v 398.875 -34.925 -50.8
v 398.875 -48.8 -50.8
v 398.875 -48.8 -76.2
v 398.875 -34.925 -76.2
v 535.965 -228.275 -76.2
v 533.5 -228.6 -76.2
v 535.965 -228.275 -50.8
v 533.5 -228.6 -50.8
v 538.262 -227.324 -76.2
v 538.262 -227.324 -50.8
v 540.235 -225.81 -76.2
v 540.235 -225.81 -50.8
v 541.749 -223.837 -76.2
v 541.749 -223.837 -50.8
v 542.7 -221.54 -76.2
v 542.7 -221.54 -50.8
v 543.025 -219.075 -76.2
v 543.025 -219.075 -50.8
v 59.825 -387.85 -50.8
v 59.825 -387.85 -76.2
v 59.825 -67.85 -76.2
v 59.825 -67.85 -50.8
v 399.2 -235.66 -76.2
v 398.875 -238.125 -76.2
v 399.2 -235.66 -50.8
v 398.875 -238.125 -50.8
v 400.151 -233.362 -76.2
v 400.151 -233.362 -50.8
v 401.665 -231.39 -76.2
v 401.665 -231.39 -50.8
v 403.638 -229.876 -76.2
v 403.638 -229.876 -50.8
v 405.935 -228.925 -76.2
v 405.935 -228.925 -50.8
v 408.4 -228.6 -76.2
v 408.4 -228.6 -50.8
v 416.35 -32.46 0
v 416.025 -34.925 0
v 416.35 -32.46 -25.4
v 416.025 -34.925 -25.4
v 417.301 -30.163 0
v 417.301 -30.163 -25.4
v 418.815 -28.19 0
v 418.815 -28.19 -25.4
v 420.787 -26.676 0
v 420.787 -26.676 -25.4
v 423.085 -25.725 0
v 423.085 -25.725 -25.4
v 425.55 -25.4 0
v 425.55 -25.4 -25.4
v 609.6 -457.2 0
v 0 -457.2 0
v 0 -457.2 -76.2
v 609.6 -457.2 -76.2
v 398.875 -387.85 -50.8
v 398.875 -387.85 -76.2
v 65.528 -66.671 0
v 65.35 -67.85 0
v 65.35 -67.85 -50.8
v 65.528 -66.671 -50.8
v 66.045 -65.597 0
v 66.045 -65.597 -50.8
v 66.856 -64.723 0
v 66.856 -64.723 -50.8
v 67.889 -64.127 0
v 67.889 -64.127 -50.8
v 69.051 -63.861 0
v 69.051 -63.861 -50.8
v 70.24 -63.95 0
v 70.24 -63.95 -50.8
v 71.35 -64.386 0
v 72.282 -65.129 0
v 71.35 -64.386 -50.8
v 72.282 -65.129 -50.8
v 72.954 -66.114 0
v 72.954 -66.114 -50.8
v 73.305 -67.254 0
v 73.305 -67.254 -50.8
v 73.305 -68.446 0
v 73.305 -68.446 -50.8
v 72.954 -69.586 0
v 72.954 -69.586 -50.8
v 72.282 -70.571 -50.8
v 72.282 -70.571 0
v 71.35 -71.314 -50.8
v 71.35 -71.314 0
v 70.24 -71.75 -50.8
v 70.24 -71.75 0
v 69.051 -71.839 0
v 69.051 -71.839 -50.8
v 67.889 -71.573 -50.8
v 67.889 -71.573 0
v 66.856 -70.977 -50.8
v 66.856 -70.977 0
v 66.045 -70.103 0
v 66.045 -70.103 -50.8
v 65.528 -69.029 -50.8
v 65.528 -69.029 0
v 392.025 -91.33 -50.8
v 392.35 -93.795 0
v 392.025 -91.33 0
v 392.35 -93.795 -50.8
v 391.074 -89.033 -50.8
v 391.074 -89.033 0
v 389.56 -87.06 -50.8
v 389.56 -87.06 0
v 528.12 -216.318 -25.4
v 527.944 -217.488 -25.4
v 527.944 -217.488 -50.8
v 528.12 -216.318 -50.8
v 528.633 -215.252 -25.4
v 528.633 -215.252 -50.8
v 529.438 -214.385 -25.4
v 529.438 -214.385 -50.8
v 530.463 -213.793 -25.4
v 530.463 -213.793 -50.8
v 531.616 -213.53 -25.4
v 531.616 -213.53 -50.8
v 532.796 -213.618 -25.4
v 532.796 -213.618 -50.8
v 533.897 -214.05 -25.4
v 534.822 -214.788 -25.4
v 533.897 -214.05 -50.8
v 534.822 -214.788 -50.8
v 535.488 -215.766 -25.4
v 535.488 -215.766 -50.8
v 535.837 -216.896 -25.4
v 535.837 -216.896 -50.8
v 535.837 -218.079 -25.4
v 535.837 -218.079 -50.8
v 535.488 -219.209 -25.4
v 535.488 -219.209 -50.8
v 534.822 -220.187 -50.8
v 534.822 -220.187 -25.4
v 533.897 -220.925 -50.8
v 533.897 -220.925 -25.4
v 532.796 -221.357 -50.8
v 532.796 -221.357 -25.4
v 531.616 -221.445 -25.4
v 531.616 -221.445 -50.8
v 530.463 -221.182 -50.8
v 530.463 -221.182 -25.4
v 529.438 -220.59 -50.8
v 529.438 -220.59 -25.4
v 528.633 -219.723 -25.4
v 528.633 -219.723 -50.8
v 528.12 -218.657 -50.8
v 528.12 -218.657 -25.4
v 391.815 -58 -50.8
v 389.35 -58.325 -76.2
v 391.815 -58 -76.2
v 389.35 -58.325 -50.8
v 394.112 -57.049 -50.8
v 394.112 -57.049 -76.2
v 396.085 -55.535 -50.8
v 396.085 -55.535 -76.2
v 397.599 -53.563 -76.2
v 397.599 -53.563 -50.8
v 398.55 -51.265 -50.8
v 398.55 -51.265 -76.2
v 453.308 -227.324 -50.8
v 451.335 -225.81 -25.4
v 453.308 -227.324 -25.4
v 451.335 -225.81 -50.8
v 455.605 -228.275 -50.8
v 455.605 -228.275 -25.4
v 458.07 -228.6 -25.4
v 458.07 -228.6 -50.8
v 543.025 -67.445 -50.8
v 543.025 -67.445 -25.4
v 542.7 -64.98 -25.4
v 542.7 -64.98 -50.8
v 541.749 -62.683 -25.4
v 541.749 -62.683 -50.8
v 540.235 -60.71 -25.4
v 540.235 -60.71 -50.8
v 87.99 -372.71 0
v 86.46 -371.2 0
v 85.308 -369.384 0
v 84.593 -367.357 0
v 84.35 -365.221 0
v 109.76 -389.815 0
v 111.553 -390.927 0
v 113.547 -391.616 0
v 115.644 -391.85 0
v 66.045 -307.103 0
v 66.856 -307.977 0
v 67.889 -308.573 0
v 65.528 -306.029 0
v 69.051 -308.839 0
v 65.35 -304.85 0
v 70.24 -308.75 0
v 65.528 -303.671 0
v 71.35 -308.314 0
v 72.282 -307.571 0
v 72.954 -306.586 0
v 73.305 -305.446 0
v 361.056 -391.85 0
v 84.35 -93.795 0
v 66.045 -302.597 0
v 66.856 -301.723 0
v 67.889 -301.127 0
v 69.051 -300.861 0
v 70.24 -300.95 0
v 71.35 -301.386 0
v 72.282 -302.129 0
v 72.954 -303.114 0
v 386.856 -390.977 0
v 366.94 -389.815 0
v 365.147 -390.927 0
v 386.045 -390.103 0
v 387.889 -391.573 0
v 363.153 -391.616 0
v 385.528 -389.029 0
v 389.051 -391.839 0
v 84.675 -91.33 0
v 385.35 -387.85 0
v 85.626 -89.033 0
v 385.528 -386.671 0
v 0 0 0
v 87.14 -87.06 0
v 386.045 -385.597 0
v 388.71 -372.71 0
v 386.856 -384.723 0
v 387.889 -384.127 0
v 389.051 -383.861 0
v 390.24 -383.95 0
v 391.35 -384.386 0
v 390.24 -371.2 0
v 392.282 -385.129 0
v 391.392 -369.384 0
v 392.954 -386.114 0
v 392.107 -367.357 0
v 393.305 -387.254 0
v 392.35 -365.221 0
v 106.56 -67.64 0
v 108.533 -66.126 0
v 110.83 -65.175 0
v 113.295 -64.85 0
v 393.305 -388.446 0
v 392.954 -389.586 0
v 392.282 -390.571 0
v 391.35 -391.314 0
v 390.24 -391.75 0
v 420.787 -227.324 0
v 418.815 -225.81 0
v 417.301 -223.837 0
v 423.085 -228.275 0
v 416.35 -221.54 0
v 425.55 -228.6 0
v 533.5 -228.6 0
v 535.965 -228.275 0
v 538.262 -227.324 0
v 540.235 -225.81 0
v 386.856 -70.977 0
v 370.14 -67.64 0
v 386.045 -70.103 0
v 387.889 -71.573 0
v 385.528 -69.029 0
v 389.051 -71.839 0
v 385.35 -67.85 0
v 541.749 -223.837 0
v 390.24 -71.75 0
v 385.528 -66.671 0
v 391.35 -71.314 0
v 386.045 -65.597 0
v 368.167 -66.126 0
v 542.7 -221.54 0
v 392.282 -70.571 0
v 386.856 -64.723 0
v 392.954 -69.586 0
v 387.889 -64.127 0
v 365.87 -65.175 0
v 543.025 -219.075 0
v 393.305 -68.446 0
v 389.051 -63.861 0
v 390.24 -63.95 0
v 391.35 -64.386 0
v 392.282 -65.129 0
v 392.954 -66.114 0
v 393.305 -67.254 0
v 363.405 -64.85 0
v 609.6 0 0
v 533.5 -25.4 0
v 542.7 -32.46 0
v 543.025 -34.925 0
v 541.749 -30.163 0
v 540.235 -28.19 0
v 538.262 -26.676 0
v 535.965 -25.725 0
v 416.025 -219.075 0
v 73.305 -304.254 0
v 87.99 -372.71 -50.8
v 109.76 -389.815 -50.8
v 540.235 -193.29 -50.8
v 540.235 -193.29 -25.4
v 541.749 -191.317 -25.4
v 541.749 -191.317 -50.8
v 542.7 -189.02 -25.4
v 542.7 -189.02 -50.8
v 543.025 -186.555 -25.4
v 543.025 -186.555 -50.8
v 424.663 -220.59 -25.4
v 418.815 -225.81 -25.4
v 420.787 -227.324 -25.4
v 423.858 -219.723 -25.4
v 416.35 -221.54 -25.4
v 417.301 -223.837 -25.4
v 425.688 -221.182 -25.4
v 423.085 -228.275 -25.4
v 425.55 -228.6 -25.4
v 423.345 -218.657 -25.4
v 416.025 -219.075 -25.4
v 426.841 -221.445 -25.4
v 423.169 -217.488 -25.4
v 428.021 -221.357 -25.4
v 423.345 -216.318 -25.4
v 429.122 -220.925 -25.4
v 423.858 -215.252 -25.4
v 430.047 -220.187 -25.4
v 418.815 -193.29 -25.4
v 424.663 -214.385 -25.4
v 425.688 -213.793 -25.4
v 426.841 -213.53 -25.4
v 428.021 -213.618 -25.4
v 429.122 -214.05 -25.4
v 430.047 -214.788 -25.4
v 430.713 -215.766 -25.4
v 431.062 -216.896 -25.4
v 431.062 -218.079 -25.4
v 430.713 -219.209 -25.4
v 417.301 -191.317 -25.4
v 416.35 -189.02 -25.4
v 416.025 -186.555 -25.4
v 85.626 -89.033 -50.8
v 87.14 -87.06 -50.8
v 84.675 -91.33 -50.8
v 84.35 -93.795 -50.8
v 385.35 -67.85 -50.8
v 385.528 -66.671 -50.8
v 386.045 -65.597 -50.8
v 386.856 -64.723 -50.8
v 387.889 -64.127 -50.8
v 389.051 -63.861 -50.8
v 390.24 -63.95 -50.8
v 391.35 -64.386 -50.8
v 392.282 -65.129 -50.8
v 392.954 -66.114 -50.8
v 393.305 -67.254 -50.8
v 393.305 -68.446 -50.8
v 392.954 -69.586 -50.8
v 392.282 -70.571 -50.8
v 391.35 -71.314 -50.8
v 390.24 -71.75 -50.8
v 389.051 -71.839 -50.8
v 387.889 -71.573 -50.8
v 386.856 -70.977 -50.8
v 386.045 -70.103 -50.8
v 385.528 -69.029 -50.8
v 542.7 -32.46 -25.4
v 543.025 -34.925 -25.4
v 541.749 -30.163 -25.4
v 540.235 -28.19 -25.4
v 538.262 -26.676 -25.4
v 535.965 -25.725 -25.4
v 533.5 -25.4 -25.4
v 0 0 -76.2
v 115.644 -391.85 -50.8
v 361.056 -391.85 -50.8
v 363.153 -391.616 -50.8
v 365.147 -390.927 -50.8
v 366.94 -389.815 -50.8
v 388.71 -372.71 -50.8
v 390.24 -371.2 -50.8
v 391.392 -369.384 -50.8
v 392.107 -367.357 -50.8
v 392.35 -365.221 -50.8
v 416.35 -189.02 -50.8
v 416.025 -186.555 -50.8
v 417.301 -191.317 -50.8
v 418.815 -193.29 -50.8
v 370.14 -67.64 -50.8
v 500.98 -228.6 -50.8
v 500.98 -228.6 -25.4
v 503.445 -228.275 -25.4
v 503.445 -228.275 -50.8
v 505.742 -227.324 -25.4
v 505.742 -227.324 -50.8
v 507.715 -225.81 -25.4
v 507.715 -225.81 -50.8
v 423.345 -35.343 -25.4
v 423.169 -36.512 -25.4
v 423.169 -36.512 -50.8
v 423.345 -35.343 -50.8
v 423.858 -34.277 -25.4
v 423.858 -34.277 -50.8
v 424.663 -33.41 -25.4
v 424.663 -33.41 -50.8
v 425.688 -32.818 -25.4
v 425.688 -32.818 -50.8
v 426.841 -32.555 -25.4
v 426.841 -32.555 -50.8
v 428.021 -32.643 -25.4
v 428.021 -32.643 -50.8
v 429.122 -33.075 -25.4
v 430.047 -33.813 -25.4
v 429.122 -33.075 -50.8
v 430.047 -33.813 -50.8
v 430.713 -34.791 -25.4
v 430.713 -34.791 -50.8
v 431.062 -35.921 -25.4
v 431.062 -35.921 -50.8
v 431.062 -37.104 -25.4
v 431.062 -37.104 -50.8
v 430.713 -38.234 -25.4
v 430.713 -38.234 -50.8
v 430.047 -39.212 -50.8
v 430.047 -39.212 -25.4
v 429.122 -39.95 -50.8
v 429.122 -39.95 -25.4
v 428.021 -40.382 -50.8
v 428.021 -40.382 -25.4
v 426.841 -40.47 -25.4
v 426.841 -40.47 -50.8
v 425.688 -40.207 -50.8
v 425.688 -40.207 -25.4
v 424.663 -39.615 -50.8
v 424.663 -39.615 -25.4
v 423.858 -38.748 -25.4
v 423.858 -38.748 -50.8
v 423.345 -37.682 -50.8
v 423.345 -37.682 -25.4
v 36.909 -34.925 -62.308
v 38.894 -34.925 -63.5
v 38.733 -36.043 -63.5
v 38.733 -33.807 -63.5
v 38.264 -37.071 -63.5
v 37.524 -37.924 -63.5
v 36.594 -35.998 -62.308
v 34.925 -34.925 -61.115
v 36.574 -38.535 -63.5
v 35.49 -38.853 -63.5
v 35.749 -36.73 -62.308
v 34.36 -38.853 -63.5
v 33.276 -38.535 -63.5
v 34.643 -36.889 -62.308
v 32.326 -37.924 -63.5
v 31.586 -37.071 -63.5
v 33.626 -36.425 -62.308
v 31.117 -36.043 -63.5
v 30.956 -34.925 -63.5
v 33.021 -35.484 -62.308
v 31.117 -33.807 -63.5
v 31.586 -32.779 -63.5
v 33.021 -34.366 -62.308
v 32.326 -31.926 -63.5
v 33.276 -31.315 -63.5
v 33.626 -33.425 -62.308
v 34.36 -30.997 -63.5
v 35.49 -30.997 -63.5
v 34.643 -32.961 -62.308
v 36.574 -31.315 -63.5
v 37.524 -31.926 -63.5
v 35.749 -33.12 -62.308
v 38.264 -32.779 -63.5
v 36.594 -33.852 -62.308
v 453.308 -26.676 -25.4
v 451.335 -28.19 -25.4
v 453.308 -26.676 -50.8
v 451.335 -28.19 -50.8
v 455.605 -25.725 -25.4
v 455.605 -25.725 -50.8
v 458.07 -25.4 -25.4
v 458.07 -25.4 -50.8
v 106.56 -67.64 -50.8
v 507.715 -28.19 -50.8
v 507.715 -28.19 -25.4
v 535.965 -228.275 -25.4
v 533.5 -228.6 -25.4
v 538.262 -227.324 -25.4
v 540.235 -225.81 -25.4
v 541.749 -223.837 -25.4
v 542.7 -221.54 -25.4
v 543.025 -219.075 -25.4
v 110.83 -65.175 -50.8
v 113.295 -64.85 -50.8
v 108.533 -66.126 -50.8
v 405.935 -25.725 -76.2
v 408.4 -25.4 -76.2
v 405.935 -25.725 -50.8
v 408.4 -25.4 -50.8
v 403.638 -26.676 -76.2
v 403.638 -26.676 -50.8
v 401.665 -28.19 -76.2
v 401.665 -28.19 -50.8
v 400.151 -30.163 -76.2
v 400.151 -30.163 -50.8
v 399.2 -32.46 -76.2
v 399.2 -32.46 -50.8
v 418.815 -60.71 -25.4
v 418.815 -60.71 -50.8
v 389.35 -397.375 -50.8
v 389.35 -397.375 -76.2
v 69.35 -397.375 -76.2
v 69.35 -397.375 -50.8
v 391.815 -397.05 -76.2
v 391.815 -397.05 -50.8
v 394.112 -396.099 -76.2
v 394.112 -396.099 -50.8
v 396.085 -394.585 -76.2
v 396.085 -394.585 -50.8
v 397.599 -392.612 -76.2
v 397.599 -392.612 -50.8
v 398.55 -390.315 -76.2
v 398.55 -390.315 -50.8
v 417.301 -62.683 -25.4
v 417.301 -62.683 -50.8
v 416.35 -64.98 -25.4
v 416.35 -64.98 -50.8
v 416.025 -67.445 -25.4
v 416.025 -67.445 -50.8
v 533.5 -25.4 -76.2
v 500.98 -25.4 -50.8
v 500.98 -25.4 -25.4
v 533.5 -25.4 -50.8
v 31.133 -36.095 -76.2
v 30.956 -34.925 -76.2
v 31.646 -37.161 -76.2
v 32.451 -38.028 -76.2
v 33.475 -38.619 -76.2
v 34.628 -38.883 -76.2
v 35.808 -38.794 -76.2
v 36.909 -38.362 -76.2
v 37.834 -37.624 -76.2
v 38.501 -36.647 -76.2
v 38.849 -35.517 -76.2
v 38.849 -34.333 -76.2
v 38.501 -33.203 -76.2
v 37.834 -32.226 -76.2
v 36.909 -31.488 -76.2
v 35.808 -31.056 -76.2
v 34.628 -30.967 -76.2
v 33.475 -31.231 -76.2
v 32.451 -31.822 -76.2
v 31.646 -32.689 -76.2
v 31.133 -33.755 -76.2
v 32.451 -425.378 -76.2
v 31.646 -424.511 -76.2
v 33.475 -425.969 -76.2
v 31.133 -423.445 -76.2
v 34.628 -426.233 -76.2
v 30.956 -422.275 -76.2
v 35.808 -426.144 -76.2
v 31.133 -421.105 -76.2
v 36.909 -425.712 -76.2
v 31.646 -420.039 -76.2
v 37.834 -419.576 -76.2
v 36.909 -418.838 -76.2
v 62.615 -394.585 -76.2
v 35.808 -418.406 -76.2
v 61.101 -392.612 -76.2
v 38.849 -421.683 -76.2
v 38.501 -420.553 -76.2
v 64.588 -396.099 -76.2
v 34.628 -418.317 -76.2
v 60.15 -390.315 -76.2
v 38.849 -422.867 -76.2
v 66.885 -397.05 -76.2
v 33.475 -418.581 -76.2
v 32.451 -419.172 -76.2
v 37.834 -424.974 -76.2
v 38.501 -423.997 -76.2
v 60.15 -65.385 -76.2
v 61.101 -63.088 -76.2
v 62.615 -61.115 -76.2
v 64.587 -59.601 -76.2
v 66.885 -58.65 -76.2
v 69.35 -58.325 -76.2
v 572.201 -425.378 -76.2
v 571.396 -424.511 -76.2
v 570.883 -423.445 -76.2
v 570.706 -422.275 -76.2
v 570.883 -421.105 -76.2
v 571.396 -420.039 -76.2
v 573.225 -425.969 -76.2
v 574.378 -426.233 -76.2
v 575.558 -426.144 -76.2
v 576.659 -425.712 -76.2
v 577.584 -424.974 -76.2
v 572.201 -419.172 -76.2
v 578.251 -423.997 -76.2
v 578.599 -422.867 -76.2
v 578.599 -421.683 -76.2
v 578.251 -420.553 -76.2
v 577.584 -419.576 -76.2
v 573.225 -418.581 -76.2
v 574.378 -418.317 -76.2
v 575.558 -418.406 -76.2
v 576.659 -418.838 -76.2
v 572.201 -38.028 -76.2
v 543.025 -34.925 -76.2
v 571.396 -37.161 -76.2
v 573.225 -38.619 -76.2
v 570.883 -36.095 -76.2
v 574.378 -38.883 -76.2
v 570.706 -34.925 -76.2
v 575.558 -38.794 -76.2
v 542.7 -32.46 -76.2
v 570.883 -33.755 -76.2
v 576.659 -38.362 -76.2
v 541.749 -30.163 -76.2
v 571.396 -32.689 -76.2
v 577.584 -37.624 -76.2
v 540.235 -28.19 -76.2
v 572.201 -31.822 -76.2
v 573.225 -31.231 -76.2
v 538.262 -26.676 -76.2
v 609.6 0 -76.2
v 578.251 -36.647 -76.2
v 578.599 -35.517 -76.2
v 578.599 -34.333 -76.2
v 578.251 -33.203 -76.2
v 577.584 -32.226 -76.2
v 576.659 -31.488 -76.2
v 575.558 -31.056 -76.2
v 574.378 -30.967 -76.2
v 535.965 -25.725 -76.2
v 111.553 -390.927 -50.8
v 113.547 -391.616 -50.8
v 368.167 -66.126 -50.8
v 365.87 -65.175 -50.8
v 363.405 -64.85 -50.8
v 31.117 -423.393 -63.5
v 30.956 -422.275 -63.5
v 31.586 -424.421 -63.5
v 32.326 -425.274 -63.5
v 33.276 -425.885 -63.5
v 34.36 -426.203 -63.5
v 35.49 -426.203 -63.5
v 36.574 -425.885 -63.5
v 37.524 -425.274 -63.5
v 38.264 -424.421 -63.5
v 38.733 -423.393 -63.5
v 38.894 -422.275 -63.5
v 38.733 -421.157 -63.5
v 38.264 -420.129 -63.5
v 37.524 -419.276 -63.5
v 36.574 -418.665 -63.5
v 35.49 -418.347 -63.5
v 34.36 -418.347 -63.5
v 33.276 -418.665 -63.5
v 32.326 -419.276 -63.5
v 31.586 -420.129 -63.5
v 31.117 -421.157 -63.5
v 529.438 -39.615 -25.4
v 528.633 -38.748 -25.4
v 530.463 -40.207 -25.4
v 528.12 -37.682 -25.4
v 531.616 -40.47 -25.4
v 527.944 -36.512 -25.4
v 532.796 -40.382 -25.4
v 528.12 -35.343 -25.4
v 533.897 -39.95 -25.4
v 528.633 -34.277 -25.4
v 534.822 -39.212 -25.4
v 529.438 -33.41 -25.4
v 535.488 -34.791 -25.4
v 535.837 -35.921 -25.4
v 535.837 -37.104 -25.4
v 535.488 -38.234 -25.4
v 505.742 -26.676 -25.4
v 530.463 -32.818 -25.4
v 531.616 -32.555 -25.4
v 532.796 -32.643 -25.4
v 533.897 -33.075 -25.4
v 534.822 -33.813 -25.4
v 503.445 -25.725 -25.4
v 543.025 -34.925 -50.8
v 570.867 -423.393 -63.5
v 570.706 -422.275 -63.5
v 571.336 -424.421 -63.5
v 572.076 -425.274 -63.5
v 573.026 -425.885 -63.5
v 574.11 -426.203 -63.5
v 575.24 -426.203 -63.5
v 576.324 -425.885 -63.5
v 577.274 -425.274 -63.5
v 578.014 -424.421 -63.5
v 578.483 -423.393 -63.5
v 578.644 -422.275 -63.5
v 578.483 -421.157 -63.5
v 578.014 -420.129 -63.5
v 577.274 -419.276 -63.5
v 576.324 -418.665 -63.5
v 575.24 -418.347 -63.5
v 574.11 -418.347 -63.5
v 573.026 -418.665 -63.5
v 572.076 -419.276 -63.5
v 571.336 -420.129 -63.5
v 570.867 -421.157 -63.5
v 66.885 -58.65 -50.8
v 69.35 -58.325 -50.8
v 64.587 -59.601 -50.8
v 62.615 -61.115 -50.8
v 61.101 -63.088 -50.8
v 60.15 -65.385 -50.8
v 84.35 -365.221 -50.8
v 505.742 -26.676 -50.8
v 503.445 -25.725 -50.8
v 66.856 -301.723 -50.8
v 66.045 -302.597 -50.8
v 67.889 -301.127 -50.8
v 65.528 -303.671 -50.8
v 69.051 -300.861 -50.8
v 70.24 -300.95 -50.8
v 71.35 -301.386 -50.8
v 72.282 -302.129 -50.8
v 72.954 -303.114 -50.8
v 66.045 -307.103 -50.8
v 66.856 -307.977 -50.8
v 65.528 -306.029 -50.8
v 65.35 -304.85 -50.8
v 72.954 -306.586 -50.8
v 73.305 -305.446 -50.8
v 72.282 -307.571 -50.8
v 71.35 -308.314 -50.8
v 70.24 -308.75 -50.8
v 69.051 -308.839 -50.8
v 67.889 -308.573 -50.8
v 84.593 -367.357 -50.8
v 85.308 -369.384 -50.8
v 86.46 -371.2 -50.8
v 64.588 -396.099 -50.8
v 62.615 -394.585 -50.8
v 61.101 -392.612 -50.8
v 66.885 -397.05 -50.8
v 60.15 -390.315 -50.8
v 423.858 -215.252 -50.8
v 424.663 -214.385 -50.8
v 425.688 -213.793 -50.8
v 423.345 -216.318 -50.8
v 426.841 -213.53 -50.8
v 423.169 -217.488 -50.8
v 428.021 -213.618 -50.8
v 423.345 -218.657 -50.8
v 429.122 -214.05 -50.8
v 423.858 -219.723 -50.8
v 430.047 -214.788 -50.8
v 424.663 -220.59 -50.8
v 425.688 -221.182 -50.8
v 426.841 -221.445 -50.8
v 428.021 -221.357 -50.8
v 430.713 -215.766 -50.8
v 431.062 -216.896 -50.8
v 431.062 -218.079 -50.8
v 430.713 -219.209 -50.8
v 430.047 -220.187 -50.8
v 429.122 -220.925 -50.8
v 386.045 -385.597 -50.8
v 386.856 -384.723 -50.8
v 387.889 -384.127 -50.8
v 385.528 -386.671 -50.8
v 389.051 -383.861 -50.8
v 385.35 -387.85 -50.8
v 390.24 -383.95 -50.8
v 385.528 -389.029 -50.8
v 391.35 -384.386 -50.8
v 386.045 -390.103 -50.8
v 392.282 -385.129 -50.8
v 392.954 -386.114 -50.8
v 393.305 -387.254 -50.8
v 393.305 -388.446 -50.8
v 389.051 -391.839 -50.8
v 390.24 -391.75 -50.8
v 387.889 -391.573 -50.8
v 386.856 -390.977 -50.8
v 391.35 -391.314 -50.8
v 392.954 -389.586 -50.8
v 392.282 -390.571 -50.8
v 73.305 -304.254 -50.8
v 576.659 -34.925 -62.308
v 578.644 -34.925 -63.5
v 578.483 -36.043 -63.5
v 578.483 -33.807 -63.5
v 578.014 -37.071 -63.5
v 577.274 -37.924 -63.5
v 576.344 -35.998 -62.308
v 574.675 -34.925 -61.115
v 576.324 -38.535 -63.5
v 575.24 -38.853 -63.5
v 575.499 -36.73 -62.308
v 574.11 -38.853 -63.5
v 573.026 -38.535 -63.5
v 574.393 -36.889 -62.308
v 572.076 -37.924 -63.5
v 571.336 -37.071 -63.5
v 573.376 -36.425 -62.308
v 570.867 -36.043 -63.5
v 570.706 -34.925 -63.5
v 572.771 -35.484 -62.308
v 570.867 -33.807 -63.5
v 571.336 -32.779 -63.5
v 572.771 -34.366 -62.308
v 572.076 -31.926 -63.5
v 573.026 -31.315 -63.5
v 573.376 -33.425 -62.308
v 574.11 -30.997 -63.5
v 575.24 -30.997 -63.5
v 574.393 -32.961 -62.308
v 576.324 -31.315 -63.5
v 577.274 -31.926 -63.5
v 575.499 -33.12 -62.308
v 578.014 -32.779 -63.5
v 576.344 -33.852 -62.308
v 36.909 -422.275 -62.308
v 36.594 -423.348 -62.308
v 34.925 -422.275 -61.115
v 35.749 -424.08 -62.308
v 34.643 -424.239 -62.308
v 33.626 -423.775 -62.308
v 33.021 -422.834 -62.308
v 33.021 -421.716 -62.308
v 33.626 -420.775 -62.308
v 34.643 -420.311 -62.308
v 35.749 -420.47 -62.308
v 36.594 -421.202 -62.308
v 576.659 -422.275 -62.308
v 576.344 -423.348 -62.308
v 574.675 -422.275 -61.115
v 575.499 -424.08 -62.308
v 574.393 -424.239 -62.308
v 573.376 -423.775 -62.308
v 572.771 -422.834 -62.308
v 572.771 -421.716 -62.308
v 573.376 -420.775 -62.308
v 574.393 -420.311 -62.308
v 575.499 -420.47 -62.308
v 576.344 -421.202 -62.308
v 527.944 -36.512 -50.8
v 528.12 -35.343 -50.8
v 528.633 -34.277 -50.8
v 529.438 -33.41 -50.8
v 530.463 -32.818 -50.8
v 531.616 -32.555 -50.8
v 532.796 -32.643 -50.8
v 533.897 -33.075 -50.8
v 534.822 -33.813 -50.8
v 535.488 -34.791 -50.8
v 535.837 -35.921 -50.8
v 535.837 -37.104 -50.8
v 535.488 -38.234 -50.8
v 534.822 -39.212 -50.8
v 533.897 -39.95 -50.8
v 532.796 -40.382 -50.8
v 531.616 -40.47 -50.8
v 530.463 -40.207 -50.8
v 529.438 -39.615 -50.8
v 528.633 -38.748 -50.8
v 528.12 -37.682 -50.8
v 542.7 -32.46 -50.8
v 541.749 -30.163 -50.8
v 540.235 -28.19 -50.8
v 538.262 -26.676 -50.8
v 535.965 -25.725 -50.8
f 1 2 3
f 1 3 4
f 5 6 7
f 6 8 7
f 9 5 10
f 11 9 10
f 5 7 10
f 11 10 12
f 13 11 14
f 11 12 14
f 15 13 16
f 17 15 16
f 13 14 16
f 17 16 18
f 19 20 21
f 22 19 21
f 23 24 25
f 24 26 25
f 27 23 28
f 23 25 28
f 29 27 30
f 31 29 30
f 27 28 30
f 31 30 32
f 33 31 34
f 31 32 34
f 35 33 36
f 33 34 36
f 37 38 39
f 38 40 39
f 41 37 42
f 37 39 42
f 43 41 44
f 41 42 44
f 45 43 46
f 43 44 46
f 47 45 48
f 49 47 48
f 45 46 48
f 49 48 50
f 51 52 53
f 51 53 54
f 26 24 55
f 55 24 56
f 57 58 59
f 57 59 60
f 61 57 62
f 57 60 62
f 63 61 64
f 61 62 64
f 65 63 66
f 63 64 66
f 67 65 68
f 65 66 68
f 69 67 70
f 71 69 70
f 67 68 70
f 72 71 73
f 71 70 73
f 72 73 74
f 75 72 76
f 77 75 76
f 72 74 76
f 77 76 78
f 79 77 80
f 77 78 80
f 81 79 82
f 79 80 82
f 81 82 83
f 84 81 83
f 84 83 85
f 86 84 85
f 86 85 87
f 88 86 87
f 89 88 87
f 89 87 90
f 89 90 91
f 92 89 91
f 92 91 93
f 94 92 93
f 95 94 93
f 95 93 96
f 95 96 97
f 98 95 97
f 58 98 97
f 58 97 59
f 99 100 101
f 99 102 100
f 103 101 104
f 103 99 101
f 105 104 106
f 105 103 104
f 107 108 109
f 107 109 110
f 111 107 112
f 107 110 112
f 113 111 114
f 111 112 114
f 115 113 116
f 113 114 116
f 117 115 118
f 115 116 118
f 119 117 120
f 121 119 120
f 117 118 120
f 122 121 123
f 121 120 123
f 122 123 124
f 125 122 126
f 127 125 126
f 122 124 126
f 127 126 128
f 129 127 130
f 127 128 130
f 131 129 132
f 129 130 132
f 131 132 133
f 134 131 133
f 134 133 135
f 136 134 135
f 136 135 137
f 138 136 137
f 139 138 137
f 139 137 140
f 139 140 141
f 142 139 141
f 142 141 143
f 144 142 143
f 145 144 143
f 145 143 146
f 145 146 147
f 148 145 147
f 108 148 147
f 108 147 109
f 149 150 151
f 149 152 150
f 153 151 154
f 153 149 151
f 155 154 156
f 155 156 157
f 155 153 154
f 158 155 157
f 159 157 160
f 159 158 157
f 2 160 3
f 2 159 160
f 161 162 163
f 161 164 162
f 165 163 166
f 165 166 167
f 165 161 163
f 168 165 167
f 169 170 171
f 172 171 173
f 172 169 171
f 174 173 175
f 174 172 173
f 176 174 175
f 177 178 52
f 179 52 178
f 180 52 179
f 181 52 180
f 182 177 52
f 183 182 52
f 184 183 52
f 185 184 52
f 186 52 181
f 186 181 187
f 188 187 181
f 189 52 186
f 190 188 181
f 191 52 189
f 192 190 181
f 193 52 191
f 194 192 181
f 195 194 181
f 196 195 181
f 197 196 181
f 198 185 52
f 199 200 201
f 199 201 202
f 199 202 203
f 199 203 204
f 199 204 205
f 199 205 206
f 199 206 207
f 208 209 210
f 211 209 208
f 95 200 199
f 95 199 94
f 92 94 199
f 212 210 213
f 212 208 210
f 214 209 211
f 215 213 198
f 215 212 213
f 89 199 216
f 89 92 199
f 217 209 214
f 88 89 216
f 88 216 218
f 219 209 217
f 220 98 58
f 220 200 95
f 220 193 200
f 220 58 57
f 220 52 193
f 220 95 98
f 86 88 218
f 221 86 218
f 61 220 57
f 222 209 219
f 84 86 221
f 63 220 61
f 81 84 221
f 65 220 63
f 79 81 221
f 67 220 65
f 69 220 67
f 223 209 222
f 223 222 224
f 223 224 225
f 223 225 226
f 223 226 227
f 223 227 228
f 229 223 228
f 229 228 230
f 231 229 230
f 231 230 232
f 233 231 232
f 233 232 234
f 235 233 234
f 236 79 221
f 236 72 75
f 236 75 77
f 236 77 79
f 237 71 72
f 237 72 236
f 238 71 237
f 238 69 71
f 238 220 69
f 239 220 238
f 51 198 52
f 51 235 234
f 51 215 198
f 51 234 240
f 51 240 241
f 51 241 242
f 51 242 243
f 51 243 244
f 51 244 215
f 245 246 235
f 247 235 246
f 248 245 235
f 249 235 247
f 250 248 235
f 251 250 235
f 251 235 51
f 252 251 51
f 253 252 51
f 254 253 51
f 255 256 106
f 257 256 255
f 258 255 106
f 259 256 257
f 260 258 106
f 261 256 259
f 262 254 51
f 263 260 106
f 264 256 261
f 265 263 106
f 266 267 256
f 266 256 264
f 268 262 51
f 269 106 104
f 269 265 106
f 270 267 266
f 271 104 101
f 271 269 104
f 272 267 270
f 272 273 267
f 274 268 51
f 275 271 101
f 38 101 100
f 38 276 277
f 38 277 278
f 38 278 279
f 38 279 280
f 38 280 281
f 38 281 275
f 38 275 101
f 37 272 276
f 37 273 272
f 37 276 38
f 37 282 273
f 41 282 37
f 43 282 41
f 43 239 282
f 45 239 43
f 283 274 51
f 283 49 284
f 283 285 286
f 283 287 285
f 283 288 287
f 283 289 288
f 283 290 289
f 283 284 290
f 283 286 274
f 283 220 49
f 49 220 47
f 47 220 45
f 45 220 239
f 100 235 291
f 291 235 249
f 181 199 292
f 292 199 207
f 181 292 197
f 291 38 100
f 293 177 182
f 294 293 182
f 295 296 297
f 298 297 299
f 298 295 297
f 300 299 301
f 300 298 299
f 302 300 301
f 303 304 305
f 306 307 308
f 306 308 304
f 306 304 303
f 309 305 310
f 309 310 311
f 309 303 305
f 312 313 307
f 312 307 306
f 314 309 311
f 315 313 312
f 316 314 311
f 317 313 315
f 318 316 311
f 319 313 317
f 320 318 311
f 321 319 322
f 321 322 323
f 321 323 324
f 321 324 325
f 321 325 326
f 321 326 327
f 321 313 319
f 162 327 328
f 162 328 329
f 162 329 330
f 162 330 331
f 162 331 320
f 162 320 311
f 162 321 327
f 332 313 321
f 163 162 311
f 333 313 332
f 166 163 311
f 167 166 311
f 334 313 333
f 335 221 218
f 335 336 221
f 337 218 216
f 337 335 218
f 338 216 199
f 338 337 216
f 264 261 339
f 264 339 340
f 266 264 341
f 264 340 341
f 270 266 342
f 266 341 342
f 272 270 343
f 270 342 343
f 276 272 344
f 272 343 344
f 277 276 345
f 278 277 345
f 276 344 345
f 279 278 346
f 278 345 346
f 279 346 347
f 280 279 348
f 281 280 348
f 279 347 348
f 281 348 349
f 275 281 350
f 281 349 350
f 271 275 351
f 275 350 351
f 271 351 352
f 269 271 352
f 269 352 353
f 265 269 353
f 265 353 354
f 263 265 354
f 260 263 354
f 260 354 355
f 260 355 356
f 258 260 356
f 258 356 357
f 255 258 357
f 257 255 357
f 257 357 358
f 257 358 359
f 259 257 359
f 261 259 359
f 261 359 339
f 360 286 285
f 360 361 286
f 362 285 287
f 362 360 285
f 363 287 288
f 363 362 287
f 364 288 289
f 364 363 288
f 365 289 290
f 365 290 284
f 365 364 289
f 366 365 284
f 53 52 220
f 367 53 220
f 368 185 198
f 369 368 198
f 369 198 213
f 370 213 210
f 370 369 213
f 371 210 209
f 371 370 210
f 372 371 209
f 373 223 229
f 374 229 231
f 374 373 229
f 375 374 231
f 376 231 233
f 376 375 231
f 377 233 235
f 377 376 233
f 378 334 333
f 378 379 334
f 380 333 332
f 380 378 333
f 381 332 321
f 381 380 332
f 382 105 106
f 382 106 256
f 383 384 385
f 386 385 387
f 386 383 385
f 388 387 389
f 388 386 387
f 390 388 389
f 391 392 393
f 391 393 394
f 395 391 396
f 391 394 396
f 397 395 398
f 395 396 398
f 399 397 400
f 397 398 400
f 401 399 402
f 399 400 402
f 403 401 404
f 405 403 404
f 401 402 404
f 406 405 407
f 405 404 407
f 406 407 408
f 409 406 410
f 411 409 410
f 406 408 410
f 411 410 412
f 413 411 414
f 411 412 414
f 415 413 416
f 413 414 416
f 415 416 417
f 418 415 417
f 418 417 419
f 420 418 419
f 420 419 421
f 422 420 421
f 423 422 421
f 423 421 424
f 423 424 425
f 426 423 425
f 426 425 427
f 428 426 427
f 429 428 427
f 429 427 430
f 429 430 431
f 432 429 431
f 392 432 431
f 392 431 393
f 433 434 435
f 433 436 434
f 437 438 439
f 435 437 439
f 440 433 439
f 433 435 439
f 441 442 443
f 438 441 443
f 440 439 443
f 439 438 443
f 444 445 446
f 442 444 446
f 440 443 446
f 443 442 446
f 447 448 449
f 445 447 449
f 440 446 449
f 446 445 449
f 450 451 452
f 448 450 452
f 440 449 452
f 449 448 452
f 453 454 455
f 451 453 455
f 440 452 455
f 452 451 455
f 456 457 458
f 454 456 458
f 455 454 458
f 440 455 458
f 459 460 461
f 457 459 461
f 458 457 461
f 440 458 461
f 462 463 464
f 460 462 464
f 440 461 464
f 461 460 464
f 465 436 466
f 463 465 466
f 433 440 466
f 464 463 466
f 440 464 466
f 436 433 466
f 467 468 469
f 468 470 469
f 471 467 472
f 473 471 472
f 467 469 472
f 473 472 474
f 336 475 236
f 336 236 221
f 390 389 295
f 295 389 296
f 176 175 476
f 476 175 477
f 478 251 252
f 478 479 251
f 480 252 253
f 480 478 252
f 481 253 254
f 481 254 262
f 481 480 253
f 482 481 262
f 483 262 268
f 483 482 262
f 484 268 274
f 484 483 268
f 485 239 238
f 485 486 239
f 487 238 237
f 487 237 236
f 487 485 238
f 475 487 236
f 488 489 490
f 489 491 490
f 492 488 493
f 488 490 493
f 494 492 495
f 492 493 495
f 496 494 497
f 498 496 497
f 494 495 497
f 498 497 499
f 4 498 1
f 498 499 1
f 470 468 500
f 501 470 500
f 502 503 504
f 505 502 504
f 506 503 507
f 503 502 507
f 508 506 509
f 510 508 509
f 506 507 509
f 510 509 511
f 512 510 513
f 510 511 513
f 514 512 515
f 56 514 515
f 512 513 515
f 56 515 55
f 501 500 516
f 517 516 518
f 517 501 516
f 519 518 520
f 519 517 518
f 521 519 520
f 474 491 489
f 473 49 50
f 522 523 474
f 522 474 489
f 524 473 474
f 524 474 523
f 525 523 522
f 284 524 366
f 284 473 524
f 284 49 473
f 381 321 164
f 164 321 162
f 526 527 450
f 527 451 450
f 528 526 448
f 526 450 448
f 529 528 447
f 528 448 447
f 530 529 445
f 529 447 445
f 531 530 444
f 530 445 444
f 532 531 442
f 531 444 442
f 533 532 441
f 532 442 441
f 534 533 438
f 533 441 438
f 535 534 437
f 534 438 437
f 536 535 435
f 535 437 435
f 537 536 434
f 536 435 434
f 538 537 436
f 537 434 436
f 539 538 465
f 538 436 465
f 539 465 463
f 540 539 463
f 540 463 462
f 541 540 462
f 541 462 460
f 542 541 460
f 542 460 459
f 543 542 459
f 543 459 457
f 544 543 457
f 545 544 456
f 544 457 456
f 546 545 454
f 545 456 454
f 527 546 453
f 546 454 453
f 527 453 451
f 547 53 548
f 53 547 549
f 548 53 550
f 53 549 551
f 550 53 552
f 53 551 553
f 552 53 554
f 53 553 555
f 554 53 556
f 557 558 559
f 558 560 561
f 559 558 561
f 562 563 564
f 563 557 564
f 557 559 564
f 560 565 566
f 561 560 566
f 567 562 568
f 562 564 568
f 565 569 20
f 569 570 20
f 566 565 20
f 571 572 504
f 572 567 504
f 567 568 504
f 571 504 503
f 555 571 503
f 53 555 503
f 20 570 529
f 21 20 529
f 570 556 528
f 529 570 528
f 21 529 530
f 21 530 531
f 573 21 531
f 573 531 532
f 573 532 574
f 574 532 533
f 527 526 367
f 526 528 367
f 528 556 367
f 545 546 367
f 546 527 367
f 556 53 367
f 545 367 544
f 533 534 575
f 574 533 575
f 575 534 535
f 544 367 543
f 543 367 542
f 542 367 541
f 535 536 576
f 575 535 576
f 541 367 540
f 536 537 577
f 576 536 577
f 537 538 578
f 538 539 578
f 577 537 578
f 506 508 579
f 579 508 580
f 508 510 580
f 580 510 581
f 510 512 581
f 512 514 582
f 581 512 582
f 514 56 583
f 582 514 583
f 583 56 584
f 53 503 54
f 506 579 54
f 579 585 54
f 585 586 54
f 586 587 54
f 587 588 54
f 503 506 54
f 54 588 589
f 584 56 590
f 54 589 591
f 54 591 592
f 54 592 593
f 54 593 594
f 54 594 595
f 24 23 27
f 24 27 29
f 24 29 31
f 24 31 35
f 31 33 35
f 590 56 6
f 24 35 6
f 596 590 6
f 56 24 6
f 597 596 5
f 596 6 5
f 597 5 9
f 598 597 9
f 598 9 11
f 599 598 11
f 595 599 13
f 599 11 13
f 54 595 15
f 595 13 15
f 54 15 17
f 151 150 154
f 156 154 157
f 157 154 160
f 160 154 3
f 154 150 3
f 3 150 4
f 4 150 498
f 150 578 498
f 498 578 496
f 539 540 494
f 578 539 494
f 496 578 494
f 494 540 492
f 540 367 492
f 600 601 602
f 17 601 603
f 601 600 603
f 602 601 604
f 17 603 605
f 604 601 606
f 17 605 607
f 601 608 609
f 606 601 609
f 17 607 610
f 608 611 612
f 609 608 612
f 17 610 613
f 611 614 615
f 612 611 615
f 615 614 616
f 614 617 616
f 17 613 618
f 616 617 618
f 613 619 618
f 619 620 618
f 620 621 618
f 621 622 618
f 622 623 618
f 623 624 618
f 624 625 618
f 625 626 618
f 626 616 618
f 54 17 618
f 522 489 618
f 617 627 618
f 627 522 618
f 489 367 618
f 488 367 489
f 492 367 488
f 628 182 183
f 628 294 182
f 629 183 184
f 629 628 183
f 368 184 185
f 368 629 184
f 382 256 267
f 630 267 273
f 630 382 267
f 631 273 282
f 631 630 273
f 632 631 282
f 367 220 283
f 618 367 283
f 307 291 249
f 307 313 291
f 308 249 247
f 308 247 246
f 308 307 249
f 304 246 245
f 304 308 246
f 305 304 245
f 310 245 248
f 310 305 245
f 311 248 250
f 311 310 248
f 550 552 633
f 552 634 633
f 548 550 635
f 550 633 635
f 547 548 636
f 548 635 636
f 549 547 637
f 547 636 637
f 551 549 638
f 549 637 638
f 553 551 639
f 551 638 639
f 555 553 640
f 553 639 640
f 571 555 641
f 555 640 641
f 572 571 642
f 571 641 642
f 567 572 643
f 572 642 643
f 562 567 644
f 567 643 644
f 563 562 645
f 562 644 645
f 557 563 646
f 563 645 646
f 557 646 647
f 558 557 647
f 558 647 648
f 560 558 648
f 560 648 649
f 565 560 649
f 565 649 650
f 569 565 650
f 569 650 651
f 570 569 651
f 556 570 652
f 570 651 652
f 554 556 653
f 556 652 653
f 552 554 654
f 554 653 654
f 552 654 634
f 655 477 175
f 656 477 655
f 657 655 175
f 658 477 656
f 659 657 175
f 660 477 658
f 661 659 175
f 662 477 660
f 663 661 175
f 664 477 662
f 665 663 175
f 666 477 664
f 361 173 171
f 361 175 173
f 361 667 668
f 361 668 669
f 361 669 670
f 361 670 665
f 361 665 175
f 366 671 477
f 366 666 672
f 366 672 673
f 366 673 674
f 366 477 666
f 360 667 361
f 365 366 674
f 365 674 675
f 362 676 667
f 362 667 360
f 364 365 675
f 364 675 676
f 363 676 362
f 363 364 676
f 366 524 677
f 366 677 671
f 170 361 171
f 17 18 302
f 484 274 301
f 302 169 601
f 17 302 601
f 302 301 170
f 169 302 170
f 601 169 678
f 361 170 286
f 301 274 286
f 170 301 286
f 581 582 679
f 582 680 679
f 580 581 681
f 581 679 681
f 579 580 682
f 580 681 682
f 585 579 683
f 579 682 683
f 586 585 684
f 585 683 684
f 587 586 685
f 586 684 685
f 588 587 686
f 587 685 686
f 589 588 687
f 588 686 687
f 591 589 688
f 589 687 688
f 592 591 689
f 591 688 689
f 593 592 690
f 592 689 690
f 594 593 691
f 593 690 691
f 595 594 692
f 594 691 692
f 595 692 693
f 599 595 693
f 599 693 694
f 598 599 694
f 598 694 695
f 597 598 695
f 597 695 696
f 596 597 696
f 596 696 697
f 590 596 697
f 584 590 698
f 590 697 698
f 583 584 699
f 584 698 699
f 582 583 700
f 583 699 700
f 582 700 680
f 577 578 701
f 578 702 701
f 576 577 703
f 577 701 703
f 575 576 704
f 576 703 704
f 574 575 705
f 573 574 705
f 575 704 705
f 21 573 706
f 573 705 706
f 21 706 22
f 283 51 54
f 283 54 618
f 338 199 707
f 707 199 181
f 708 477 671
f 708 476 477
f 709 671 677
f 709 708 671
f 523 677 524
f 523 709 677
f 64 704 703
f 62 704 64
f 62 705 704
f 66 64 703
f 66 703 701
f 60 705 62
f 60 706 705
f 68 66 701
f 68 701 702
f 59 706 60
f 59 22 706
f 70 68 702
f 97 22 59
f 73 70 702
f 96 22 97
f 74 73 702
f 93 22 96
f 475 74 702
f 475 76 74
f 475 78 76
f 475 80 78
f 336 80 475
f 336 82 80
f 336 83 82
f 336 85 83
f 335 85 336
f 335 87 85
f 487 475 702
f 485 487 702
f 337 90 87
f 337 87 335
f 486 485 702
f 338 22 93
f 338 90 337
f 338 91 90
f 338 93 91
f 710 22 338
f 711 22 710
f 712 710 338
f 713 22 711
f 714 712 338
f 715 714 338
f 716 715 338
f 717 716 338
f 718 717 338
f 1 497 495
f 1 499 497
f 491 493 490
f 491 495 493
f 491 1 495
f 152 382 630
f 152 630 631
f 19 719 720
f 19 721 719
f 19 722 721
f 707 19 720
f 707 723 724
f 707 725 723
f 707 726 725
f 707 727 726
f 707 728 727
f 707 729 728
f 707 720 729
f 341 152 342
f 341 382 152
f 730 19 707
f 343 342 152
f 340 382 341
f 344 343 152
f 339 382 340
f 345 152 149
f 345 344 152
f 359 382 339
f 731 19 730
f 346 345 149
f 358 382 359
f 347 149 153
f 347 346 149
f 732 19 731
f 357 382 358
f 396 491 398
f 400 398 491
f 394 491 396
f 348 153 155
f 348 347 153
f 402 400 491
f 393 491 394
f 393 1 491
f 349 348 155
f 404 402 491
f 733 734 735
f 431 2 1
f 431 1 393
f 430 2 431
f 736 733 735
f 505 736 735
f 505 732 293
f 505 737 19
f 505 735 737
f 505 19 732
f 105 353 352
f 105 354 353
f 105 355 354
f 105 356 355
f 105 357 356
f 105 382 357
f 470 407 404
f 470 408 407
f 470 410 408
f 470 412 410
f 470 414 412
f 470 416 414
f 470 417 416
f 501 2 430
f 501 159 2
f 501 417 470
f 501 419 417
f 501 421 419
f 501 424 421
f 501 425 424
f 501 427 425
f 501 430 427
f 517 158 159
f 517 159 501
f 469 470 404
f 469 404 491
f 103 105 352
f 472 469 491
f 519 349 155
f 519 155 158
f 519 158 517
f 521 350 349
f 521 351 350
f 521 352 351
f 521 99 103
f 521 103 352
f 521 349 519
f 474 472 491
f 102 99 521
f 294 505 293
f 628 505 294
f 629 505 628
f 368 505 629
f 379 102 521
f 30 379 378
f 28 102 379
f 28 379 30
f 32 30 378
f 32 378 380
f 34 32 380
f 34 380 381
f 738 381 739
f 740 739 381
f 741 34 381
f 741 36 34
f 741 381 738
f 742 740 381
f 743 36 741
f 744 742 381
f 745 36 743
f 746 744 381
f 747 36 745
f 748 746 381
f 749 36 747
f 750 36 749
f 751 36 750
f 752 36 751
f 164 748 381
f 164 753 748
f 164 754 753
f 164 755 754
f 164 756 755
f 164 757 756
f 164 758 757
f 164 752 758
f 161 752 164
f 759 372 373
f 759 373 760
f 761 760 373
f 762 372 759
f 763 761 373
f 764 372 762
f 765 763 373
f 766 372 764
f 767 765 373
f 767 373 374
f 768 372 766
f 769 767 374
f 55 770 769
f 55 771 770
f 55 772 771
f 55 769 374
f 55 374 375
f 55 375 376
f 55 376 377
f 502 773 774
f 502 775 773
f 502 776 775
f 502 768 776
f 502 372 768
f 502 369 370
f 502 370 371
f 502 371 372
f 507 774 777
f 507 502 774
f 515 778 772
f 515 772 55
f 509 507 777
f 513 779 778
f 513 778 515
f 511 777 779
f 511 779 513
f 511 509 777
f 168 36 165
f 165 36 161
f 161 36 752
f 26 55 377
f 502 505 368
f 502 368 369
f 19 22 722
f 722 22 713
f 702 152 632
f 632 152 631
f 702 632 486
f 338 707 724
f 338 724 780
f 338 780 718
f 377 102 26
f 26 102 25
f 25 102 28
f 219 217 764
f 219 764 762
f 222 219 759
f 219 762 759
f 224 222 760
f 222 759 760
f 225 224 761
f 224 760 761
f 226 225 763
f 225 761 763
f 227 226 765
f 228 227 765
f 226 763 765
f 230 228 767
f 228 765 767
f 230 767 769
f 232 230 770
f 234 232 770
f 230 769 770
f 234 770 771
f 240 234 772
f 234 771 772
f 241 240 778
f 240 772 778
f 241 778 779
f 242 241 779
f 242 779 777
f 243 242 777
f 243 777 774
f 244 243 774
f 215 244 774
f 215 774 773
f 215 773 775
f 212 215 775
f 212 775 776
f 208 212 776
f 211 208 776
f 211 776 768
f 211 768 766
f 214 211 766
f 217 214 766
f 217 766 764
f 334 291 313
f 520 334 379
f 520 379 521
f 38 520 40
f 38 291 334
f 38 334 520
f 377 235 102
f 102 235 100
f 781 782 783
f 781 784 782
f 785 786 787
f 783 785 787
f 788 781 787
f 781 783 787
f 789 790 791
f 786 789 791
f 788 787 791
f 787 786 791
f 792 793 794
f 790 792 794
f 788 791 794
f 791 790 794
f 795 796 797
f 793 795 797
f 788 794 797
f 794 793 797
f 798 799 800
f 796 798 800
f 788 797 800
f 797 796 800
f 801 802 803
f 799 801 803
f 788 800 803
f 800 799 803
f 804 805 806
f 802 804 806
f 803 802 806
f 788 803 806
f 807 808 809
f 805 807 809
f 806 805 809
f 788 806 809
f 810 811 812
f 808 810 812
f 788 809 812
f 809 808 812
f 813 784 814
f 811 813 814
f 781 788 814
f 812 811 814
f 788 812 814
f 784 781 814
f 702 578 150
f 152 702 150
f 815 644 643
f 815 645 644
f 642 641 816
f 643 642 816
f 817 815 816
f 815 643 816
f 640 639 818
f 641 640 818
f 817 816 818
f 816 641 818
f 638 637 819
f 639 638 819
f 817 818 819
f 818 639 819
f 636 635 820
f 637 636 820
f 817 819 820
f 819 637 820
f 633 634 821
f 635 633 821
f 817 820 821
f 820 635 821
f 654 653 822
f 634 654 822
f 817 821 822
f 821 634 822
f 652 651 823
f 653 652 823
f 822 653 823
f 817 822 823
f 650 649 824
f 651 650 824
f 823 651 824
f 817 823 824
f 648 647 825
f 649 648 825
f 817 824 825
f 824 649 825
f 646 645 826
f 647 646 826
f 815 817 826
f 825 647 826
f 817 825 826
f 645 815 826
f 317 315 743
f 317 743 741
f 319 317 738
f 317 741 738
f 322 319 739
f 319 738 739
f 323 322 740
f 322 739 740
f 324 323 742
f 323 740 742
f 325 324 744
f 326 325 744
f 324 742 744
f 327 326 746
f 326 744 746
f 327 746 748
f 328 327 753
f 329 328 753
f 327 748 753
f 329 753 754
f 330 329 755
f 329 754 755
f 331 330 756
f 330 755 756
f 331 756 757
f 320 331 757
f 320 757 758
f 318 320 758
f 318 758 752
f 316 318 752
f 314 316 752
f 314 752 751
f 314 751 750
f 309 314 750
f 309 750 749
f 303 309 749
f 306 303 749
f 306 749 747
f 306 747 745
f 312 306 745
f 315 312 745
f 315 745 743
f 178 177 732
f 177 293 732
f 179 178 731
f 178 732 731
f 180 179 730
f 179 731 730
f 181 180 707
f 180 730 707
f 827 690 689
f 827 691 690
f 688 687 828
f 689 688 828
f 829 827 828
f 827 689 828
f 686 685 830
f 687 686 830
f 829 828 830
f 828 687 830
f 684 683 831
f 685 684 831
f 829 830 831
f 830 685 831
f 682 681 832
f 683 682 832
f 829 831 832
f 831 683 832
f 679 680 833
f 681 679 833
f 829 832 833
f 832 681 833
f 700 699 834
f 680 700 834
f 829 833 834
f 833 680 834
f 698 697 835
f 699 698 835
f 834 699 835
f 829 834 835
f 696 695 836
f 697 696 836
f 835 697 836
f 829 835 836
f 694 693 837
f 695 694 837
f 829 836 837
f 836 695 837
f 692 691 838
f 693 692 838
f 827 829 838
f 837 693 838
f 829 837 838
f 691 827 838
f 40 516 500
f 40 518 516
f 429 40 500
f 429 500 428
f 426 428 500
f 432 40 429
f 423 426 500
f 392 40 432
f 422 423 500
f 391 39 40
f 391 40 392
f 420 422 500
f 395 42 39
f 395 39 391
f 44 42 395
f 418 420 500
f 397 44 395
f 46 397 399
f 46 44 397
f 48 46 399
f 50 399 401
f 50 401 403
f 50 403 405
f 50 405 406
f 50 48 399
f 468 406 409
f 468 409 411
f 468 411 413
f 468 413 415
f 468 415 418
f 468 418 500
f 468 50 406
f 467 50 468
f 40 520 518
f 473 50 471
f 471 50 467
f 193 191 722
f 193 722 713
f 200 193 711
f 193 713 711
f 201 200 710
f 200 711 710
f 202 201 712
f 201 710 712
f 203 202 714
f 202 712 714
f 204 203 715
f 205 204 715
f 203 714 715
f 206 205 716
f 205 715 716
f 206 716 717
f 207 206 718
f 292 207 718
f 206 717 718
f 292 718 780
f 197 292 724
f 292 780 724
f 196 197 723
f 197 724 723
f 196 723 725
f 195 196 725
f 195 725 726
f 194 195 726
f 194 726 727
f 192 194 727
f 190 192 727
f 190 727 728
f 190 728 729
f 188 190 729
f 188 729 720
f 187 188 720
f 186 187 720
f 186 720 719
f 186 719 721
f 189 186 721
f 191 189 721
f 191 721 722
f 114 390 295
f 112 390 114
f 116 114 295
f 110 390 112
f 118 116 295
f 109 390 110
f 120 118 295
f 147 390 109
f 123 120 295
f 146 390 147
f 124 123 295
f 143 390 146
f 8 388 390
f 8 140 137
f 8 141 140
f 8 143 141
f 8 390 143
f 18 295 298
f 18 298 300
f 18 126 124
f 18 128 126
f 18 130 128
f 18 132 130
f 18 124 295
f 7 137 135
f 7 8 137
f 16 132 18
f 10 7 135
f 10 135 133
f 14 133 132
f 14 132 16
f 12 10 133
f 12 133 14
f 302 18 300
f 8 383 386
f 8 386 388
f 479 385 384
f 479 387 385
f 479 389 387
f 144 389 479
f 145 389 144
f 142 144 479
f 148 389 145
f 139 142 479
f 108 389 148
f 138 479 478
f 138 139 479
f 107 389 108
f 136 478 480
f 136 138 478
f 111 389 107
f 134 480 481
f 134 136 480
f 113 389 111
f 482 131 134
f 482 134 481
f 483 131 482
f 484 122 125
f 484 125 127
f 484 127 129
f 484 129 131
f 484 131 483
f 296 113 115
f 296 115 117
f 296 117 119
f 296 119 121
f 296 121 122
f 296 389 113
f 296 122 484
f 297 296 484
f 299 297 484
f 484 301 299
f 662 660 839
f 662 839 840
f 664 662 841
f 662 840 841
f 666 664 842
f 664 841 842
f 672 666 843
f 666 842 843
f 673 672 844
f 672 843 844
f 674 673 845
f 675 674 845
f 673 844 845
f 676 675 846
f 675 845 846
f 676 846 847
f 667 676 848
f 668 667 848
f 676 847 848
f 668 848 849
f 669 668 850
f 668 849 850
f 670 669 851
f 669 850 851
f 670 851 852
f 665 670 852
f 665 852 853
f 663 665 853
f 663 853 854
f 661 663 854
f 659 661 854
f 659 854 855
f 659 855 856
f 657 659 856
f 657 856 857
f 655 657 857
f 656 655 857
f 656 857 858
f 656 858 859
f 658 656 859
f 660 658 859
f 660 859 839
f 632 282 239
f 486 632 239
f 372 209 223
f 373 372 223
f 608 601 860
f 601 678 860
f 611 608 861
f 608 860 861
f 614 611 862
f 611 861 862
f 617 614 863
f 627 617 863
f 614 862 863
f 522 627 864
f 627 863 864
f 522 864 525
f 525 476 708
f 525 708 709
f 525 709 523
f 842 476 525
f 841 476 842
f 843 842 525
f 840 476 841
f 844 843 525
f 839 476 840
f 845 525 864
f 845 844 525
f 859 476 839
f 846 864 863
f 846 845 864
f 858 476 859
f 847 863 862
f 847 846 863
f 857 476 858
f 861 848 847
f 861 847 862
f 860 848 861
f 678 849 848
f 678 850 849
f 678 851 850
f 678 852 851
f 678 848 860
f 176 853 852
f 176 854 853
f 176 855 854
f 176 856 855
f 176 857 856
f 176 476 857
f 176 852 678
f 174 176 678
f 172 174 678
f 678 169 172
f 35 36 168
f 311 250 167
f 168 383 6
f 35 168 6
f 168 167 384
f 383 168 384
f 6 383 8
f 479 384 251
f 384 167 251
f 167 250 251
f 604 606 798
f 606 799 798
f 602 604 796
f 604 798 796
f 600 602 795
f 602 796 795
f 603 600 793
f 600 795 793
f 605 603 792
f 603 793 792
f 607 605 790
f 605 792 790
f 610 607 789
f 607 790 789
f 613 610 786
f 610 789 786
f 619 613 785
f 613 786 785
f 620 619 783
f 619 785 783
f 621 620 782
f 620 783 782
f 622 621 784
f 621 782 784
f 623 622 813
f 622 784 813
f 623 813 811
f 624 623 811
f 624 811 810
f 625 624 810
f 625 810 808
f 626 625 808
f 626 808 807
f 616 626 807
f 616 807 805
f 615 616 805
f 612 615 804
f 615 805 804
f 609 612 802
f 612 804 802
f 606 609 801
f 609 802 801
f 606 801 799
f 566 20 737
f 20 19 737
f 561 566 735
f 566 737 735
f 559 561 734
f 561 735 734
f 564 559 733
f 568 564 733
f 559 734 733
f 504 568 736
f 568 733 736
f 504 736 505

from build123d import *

# Parameters (mm, degrees)
F0_W      = 609.6
F0_H      = 457.2
F1_DEPTH  = 76.2
F3_DEPTH  = 76.201
F5_D      = 8
F6_W      = 127
F6_H      = 203.2
F7_DEPTH  = 25.4
F9_DEPTH  = 76.201
F11_DEPTH = 25.4
F12_R     = 9.525
F14_D     = 7.9375
F16_D     = 7.9375
F16_DEPTH = 12.7
F16_TIP   = 2.3846655818


# Not quite as in the source:
# - a feature names something its author has since deleted; it is built from what else it names


with BuildPart() as f1:
    # F0 (on Top) → F1 (new body)
    with BuildSketch(Plane.XY):
        with Locations((304.8, -228.6)):
            Rectangle(F0_W, F0_H)
    extrude(amount=-F1_DEPTH)

    # F2 (on Top) → F3 (cut, through all)
    with BuildSketch(Plane.XY):
        Polygon((392.35, -89.85), (367.35, -64.85), (109.35, -64.85), (84.35, -89.85), (84.35, -369.85), (112.35, -391.85), (364.35, -391.85), (392.35, -369.85), align=None)
    extrude(amount=-F3_DEPTH, mode=Mode.SUBTRACT)

    # F5 (through all)
    with Locations(Plane.XY):
        with Locations((69.35, -67.85), (389.35, -67.85), (389.35, -387.85), (69.35, -304.85)):
            Hole(F5_D / 2)

    # F6 (on Top) → F7 (cut)
    with BuildSketch(Plane.XY):
        with Locations((479.525, -127)):
            Rectangle(F6_W, F6_H)
    extrude(amount=-F7_DEPTH, mode=Mode.SUBTRACT)

    # F8 (on Top) → F9 (cut, through all)
    with BuildSketch(Plane.XY):
        Polygon((454.125, -25.4), (416.025, -63.5), (416.025, -190.5), (454.125, -228.6), (504.925, -228.6), (543.025, -190.5), (543.025, -63.5), (504.925, -25.4), align=None)
    extrude(amount=-F9_DEPTH, mode=Mode.SUBTRACT)

    # F10 (on face) → F11 (cut)
    with BuildSketch(Plane(origin=(0, 0, -76.2), x_dir=(1, 0, 0), z_dir=(0, 0, -1))):
        Polygon((398.875, 25.4), (416.025, 25.4), (543.025, 25.4), (543.025, 228.6), (416.025, 228.6), (398.875, 228.6), (398.875, 397.375), (59.825, 397.375), (59.825, 58.325), (398.875, 58.325), align=None)
    extrude(amount=-F11_DEPTH, mode=Mode.SUBTRACT)

    # F12
    f12_edges = [f1.edges().sort_by_distance(p)[0] for p in [
        (364.35, -391.85, -25.4),
        (392.35, -369.85, -25.4),
        (392.35, -89.85, -25.4),
        (367.35, -64.85, -25.4),
        (109.35, -64.85, -25.4),
        (84.35, -89.85, -25.4),
        (84.35, -369.85, -25.4),
        (112.35, -391.85, -25.4),
        (59.825, -397.375, -63.5),
        (59.825, -58.325, -63.5),
        (398.875, -58.325, -63.5),
        (398.875, -25.4, -63.5),
        (543.025, -25.4, -63.5),
        (543.025, -228.6, -63.5),
        (398.875, -228.6, -63.5),
        (398.875, -397.375, -63.5),
        (454.125, -228.6, -38.1),
        (416.025, -190.5, -38.1),
        (504.925, -228.6, -38.1),
        (543.025, -190.5, -38.1),
        (416.025, -63.5, -38.1),
        (454.125, -25.4, -38.1),
        (504.925, -25.4, -38.1),
        (543.025, -63.5, -38.1),
        (416.025, -25.4, -12.7),
        (543.025, -25.4, -12.7),
        (416.025, -228.6, -12.7),
        (543.025, -228.6, -12.7),
    ]]
    fillet(f12_edges, radius=F12_R)

    # F14 (through all)
    with Locations(Plane.XY):
        with Locations((427.1375, -36.5125), (531.9125, -36.5125), (531.9125, -217.4875), (427.1375, -217.4875)):
            Hole(F14_D / 2)

    # F16
    with Locations(Plane(origin=(0, 0, -76.2), x_dir=(1, 0, 0), z_dir=(0, 0, -1))):
        with Locations((34.925, 422.275), (574.675, 422.275), (574.675, 34.925), (34.925, 34.925)):
            Hole(F16_D / 2, depth=F16_DEPTH)
            with Locations((0, 0, -(F16_DEPTH + F16_TIP / 2))):  # 118° drill point
                Cone(0, F16_D / 2, F16_TIP, mode=Mode.SUBTRACT)


solid = f1.part
